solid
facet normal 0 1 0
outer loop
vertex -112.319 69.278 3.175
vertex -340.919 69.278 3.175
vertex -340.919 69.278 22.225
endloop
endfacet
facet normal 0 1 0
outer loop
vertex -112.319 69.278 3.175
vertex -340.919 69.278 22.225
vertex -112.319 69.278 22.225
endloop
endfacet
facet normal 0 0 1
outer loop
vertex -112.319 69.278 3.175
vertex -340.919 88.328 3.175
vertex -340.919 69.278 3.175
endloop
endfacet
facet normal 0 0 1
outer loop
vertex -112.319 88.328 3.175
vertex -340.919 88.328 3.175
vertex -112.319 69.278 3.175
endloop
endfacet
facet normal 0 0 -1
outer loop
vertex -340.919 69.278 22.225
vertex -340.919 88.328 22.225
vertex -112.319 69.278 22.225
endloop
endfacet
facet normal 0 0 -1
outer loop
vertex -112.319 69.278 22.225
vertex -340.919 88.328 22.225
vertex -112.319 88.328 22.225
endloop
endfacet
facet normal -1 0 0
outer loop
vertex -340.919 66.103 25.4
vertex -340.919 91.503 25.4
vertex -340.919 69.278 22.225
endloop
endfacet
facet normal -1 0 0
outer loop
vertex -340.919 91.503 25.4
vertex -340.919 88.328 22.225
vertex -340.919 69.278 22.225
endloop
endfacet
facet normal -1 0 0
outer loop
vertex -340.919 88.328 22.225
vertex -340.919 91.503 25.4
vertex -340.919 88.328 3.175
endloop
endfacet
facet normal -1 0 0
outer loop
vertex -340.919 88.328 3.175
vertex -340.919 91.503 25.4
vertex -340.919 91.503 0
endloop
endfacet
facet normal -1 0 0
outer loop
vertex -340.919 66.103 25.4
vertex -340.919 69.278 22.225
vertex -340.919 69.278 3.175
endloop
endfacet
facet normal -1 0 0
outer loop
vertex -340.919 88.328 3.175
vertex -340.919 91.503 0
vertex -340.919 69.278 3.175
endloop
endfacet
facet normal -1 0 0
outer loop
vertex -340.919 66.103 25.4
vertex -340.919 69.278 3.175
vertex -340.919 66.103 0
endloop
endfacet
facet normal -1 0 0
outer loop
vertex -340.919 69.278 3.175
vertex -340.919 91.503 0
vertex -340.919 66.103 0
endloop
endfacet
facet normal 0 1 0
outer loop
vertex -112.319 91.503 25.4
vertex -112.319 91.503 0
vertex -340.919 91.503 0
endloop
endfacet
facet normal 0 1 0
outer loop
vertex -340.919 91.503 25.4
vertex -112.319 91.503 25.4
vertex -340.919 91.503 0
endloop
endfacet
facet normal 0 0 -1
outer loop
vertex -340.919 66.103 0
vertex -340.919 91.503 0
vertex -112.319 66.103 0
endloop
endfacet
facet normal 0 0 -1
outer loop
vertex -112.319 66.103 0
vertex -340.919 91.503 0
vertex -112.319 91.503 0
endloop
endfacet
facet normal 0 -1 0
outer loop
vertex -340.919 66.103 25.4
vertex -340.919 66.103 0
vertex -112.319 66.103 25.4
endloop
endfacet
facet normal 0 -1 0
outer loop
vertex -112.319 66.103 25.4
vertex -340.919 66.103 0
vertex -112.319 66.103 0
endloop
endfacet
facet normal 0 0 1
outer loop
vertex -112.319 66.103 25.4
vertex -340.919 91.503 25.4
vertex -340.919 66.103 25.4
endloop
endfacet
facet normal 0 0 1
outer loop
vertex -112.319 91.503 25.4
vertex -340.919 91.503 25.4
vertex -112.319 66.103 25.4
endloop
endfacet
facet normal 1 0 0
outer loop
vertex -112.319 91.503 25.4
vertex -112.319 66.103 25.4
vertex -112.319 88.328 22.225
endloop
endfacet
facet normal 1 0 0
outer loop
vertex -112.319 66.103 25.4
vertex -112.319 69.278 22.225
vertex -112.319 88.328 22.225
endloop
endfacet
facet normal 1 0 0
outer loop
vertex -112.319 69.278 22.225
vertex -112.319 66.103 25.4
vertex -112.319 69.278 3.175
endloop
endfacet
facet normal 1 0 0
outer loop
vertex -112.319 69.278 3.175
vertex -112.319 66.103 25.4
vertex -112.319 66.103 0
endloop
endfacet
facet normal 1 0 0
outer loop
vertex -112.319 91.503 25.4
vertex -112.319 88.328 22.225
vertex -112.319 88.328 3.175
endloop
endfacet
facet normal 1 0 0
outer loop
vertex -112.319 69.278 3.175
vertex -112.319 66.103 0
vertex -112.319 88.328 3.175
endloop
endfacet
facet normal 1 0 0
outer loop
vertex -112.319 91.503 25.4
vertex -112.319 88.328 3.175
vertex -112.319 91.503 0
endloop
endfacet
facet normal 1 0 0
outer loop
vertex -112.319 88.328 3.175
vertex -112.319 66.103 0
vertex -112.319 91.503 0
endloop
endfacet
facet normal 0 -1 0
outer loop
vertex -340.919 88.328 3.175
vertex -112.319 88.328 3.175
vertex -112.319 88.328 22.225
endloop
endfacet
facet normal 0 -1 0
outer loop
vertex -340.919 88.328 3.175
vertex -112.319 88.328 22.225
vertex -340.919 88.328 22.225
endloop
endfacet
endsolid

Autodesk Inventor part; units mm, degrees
ref_plane "YZ Plane" through (0, 0, 0) normal (1, 0, 0) x (0, 1, 0)
ref_plane "XZ Plane" through (0, 0, 0) normal (0, 1, 0) x (-1, 0, 0)
ref_plane "XY Plane" through (0, 0, 0) normal (0, 0, 1) x (1, 0, 0)
sketch "Sketch1" plane through (0, 0, 0) normal (0, 0, 1) x (1, 0, 0)
  line L0 (-112.3194, 91.5028) -> (-340.9194, 91.5028)
  line L1 (-340.9194, 91.5028) -> (-340.9194, 66.1028)
  line L2 (-340.9194, 66.1028) -> (-112.3194, 66.1028)
  line L3 (-112.3194, 66.1028) -> (-112.3194, 91.5028)
  point P0 (0, 0)
  dimension "d0" = 228.6
  dimension "d1" = 25.4
extrude "Extrusion1" add sketch "Sketch1" along normal blind 25.4
shell "Shell1" thickness 3.175 removed faces 2 at (-112.3194, 74.5695, 8.4667) at (-340.9194, 83.0362, 8.4667)
